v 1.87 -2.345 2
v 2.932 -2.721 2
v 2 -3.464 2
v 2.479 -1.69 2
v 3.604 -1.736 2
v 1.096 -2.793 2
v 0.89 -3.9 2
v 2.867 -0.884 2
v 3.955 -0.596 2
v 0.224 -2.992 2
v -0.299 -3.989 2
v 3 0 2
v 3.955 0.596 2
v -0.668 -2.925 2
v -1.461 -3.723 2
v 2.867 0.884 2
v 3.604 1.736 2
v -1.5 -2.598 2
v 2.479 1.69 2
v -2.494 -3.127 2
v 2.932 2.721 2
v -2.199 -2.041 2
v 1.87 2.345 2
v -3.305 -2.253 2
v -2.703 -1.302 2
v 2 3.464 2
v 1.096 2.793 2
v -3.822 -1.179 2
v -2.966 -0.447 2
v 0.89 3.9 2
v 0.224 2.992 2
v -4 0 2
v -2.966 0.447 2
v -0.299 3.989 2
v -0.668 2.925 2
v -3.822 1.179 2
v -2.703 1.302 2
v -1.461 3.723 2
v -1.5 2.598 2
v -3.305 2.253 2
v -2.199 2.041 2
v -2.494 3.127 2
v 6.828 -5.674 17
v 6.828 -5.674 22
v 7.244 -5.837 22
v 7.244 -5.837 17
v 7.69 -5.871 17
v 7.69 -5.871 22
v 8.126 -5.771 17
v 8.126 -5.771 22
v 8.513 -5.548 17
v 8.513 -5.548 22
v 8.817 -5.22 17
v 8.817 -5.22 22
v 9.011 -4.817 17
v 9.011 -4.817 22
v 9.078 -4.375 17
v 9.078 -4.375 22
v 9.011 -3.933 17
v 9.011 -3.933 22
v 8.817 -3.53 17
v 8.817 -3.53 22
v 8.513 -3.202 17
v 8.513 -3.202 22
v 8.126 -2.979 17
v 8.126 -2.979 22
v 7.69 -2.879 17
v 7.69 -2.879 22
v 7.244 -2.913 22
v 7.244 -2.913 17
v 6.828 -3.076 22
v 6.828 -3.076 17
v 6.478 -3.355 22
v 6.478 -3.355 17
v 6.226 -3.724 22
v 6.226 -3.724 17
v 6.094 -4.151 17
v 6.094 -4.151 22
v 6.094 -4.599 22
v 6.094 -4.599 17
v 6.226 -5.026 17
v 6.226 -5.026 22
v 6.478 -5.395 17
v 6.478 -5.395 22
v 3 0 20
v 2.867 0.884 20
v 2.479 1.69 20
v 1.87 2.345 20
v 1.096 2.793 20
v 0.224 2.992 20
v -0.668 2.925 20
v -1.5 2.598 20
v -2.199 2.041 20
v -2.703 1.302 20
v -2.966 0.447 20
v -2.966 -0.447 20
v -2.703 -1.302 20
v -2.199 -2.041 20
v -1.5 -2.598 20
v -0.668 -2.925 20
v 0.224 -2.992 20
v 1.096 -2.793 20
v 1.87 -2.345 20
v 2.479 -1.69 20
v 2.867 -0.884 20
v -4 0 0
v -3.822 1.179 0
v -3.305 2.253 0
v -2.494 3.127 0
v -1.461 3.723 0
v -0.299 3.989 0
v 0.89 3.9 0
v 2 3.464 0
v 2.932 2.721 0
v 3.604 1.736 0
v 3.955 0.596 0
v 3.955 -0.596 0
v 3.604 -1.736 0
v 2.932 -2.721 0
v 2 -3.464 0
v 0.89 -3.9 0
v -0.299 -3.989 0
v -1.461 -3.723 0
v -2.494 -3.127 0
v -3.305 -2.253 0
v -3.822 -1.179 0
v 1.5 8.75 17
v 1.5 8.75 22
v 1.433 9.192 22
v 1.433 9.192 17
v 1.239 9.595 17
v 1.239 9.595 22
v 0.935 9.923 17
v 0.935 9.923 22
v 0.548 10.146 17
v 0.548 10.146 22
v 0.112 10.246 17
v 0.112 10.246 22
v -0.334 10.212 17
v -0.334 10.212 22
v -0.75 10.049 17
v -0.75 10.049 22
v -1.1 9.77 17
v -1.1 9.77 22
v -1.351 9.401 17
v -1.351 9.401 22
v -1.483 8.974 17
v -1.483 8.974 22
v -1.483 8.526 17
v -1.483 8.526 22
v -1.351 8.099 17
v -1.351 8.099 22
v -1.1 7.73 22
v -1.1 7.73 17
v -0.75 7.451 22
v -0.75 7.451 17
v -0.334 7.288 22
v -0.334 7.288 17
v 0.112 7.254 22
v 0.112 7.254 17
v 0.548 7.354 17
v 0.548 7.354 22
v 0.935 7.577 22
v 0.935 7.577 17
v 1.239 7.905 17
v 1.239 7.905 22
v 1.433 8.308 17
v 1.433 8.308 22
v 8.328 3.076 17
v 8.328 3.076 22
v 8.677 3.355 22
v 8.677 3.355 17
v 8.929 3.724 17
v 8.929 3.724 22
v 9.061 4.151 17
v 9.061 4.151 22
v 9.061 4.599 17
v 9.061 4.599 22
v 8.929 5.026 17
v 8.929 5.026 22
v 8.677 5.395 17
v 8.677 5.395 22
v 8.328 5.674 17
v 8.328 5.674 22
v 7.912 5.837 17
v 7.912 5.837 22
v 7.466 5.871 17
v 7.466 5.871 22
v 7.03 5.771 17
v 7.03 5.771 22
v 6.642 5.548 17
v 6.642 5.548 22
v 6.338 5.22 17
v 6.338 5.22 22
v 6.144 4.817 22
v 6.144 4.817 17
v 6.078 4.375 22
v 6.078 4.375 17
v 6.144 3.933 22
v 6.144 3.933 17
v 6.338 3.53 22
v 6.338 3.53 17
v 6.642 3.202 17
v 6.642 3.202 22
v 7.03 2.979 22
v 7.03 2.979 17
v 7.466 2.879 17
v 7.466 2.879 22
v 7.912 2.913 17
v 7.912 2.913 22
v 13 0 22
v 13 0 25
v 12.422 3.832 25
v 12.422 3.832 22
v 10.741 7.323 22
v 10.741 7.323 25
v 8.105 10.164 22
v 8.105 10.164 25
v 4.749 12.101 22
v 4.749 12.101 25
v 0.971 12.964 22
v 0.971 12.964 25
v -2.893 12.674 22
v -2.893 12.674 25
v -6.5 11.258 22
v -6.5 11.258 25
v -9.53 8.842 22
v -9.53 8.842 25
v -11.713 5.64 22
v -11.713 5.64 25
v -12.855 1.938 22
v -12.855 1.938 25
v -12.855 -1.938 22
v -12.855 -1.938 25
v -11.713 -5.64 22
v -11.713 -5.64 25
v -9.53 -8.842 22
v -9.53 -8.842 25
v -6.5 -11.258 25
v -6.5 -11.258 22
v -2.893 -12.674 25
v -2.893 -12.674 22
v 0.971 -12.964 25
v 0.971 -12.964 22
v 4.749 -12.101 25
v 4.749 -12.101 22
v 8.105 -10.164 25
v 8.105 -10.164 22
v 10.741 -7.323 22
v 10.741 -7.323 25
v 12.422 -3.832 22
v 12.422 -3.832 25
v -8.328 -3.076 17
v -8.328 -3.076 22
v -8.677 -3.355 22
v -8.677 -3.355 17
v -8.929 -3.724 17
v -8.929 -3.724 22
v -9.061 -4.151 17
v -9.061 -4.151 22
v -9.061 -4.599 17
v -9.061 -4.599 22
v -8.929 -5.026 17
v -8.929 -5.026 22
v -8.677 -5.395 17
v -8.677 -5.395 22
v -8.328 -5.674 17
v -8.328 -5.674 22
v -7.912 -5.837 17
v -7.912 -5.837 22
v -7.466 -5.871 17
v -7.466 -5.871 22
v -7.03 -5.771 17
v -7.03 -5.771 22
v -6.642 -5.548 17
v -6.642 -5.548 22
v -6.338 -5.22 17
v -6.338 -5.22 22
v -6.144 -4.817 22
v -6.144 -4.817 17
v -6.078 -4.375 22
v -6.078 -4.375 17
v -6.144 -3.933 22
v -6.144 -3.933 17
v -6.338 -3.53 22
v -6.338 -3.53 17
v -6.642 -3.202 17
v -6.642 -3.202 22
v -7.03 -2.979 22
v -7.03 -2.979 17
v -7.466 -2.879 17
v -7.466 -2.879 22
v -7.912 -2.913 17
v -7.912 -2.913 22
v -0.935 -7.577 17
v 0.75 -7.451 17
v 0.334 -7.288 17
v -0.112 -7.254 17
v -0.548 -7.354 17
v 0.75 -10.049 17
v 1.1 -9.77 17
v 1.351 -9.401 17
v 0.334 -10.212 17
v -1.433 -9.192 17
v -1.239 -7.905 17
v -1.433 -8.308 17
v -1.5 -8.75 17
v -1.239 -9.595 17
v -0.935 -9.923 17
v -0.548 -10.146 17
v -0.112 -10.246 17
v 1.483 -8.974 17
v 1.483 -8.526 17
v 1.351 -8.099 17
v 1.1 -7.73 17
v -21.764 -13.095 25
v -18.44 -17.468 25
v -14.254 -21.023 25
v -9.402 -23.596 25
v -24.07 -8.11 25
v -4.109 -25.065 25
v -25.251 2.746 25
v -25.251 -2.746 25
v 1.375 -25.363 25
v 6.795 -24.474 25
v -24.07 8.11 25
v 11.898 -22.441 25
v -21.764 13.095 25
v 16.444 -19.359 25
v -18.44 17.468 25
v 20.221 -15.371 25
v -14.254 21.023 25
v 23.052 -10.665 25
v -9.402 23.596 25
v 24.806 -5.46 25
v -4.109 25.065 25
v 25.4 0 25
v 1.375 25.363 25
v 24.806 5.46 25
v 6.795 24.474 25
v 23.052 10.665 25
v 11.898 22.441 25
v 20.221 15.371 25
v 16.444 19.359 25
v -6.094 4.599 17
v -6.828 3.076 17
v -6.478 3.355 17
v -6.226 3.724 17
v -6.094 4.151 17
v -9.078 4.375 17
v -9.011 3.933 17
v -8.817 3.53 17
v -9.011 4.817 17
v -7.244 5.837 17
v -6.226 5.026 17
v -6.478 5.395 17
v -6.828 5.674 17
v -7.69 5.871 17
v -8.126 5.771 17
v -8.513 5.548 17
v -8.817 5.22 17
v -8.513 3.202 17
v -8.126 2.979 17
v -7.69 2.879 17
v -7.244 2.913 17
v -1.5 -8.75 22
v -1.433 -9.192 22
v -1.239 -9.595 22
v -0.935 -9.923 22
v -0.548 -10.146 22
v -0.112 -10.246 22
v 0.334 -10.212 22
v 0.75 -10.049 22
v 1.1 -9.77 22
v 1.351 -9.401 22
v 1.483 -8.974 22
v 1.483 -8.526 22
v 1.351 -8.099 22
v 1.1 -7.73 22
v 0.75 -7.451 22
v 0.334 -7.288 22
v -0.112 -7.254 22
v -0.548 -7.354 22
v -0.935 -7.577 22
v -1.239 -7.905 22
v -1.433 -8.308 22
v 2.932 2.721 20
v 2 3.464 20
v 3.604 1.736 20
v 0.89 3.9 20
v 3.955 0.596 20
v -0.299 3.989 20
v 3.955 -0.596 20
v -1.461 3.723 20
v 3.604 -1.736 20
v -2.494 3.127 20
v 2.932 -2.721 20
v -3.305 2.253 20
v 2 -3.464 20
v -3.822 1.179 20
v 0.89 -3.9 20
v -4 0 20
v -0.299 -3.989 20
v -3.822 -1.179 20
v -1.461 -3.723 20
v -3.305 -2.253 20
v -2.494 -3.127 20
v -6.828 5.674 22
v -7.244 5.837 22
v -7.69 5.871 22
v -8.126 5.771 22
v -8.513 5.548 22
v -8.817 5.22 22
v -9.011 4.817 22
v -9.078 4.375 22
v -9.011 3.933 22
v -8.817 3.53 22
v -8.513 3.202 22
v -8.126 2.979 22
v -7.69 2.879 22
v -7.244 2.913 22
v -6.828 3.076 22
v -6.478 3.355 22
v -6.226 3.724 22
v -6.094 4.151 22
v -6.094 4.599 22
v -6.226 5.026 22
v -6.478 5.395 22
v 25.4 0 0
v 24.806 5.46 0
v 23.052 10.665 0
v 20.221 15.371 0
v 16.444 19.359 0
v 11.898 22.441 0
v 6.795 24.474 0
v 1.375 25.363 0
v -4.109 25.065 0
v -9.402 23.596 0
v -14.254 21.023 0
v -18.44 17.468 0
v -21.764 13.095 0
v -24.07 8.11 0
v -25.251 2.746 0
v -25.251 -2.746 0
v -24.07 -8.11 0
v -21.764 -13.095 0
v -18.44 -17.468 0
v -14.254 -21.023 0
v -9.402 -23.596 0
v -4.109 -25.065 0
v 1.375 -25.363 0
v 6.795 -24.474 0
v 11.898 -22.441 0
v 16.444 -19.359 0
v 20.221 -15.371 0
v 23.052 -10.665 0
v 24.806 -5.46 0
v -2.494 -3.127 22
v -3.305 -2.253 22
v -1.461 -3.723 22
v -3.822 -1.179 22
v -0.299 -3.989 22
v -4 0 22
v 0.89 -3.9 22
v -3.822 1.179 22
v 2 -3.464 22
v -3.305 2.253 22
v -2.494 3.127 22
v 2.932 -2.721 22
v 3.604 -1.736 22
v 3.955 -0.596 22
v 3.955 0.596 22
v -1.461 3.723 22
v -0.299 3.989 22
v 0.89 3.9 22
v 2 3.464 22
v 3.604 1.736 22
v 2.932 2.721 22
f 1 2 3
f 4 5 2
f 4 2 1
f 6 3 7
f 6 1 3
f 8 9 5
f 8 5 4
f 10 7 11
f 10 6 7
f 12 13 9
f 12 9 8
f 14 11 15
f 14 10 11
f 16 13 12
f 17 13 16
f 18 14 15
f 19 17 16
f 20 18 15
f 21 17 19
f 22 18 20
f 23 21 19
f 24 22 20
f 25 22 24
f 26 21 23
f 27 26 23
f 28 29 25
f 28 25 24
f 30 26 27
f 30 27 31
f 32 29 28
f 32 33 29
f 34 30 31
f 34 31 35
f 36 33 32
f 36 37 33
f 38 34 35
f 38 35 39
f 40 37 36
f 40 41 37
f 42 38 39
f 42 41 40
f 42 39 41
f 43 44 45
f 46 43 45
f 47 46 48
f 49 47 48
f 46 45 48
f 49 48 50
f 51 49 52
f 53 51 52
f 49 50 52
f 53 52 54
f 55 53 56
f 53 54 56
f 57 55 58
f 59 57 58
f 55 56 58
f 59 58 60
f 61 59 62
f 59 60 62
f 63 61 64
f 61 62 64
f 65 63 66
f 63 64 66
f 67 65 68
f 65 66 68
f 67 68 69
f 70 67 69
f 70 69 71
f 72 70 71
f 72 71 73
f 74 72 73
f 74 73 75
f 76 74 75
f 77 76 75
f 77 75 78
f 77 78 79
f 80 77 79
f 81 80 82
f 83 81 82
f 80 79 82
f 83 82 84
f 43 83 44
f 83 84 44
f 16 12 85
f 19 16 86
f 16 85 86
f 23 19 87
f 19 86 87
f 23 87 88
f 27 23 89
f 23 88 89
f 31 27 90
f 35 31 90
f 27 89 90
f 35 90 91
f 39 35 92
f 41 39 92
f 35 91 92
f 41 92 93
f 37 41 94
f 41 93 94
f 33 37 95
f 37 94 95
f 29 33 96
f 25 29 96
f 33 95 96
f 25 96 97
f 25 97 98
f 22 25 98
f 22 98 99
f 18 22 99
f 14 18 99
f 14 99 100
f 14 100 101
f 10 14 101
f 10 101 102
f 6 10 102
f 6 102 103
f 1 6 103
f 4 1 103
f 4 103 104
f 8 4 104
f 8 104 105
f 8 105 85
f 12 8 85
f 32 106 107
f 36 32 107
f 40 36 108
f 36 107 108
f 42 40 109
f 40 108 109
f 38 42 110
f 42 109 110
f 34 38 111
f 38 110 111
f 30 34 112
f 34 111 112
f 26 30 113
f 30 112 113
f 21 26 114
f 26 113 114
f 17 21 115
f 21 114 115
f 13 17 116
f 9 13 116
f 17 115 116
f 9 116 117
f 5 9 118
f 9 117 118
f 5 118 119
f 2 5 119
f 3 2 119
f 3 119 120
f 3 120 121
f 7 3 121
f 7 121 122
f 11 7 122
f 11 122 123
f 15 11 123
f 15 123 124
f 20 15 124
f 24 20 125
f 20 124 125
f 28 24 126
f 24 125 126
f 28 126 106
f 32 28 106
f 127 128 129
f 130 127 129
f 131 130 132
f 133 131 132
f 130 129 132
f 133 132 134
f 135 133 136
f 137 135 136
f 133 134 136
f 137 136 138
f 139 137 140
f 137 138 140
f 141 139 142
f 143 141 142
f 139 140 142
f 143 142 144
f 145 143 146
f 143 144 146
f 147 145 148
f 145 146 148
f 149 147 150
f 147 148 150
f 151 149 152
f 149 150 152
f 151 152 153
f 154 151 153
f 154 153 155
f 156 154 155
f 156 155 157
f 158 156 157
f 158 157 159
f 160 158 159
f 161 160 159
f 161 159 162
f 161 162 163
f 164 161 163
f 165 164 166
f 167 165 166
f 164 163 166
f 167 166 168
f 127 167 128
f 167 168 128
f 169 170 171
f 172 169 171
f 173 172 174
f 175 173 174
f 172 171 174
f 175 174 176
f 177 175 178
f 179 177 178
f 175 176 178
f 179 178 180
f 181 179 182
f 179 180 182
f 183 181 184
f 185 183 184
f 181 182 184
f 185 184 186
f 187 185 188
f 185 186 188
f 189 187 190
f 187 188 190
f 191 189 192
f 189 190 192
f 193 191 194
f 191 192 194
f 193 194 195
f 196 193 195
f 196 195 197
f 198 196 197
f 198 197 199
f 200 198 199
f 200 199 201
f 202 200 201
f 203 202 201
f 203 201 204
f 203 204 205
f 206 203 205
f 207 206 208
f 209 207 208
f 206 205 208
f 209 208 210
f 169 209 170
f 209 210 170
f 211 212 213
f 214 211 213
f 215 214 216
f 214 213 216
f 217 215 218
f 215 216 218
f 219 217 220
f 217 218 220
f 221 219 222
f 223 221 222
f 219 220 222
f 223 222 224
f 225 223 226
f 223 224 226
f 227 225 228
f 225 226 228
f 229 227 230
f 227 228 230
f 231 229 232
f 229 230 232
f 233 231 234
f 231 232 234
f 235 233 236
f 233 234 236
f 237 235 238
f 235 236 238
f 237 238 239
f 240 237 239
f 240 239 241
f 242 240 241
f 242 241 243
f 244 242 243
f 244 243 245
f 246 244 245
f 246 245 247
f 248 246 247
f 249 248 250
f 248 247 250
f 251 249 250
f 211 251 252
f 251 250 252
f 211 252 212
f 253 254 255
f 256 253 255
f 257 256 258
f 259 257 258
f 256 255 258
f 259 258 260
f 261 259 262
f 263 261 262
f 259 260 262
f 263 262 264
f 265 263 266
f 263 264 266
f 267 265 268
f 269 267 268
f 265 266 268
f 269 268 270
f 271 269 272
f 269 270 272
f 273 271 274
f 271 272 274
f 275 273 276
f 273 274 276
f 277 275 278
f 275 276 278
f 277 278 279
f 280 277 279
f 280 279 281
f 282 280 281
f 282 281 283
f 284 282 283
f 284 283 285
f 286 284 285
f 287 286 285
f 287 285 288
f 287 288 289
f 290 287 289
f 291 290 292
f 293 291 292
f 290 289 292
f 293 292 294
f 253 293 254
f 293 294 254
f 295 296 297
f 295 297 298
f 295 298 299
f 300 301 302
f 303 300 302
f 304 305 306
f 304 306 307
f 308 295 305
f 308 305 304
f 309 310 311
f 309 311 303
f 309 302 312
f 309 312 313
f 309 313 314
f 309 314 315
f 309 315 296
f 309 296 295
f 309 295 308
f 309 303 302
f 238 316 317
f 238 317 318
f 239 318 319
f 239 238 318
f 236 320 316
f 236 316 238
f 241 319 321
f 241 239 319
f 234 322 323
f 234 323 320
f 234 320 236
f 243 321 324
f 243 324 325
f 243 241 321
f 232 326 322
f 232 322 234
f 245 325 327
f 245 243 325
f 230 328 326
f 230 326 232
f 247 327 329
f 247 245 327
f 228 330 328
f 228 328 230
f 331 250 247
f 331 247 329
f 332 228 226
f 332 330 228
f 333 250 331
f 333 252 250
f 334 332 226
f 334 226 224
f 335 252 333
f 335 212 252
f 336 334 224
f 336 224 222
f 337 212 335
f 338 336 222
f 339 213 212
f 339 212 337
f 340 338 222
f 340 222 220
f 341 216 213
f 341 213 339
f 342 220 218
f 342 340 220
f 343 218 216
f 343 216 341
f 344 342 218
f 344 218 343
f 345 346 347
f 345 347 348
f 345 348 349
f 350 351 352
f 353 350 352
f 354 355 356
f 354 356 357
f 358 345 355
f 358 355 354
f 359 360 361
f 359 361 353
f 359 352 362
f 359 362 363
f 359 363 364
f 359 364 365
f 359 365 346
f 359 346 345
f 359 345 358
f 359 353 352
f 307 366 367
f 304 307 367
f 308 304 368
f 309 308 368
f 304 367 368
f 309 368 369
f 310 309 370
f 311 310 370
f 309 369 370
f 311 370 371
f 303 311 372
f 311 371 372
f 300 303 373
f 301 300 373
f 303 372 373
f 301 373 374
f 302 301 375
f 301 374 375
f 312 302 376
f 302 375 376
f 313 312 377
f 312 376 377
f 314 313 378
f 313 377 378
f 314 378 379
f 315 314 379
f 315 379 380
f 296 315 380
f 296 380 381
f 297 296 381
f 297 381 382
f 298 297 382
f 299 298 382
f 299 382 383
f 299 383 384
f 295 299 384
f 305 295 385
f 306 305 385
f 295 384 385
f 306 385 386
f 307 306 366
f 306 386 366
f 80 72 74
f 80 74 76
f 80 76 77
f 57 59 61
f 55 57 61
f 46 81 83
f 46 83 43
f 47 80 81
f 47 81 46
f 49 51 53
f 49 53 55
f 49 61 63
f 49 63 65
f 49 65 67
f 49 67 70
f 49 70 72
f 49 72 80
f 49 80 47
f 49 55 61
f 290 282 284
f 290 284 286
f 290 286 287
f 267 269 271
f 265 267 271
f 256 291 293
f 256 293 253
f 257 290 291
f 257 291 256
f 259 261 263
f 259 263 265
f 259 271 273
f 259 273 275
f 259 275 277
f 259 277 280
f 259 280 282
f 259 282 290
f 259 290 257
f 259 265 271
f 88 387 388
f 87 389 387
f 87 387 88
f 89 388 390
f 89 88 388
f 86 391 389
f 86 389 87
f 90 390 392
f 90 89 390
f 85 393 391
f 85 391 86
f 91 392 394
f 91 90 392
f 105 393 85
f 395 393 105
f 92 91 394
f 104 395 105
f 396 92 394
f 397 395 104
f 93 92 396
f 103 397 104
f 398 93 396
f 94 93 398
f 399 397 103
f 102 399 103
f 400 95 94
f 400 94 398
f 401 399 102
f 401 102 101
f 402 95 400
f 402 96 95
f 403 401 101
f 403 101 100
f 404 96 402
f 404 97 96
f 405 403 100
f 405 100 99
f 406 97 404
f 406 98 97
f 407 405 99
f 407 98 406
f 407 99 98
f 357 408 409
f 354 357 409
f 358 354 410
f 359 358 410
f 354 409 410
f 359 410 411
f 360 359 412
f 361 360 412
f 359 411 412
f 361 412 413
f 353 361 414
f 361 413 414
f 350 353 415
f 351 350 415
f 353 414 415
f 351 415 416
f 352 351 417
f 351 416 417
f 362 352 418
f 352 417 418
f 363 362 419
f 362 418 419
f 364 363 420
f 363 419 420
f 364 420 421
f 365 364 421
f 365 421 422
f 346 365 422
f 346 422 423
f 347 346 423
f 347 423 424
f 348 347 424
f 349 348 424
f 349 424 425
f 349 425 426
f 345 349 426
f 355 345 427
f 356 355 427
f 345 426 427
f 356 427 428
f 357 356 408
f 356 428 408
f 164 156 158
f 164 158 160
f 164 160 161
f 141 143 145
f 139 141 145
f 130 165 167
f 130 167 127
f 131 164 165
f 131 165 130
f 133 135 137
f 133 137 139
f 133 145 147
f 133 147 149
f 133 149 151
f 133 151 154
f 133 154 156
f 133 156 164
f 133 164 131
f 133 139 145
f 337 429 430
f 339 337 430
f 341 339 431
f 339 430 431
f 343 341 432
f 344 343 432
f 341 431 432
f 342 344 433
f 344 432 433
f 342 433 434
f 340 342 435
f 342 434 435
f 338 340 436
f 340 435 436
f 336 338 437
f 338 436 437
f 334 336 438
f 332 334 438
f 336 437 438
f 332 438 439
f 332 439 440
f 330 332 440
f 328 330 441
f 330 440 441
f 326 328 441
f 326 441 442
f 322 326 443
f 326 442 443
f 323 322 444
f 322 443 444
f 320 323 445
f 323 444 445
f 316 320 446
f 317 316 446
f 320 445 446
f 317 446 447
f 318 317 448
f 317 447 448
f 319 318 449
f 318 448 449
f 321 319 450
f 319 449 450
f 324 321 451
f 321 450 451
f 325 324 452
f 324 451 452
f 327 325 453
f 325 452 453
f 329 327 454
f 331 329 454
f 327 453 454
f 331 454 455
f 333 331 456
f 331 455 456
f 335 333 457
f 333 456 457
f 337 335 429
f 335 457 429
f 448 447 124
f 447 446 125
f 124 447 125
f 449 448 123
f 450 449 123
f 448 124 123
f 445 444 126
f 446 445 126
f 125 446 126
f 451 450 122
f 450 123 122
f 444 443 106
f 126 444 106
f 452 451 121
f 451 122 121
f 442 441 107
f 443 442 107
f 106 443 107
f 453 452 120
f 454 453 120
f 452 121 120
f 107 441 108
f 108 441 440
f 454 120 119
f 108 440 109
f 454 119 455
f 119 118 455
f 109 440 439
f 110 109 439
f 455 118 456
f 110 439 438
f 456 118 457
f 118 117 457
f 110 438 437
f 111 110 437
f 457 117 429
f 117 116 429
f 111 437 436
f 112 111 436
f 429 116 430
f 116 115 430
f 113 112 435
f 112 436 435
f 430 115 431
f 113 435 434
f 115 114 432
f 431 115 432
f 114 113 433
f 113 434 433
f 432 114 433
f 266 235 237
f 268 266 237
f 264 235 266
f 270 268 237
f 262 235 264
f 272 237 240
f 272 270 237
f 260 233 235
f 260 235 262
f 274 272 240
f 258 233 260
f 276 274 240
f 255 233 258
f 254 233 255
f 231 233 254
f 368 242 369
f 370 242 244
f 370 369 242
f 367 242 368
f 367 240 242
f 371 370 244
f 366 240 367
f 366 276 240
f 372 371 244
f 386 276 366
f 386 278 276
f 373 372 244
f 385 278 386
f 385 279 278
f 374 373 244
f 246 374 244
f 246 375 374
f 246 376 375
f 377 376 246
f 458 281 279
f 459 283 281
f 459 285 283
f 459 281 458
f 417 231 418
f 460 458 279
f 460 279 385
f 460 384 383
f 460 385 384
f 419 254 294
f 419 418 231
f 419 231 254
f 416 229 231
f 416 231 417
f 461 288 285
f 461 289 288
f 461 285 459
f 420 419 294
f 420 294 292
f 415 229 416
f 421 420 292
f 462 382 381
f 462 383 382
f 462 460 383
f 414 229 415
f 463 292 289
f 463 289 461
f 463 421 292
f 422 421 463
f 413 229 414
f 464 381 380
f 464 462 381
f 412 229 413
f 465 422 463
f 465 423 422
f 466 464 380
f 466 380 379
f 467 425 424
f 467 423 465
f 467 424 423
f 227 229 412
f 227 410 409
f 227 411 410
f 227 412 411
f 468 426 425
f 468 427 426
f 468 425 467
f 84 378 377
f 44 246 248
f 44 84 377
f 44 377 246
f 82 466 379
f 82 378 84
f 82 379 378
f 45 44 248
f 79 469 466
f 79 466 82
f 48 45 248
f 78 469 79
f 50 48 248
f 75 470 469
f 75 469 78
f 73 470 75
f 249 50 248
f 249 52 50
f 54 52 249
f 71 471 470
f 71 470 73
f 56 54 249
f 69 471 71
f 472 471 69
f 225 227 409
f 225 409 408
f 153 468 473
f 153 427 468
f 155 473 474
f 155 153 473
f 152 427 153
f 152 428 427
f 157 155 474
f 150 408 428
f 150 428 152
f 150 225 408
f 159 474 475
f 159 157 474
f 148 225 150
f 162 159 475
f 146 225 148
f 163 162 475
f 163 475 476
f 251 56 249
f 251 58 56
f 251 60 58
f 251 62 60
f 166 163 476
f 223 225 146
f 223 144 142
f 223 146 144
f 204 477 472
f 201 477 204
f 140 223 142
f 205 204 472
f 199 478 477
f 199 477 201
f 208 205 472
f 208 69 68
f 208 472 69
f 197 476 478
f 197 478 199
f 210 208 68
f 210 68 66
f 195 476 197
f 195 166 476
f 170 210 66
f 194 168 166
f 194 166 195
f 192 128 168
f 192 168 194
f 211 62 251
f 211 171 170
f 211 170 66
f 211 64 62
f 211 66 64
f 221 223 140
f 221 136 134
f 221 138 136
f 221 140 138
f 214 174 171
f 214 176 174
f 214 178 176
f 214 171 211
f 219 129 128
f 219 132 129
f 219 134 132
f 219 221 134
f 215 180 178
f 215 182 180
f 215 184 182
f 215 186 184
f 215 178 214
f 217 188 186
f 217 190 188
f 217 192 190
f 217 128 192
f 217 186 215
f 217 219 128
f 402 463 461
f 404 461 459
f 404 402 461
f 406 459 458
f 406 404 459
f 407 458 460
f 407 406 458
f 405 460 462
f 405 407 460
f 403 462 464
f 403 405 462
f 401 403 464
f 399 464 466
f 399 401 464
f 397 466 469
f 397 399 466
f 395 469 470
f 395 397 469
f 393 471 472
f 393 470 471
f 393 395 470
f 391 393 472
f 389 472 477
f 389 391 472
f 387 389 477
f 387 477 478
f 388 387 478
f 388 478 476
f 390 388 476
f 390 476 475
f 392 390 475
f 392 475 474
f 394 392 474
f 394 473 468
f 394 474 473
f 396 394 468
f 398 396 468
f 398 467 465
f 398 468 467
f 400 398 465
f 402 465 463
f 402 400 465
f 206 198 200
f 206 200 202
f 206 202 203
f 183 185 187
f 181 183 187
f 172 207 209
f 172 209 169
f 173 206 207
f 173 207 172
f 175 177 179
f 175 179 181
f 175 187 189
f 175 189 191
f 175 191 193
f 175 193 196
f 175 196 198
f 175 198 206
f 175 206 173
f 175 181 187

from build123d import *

# Parameters (mm, degrees)
SKETCH1_R           = 25.4
BOSS_EXTRUDE1_DEPTH = 25
SKETCH2_R           = 3
CUT_EXTRUDE1_DEPTH  = 44.764369069
SKETCH4_R           = 4
CUT_EXTRUDE4_DEPTH  = 2
SKETCH6_R           = 13
CUT_EXTRUDE6_DEPTH  = 3
SKETCH9_R           = 1.5
CUT_EXTRUDE7_DEPTH  = 5
CUT_EXTRUDE8_START  = -5
SKETCH3_R           = 4
CUT_EXTRUDE8_DEPTH  = 5
CIRPATTERN1_COUNT   = 6


with BuildPart() as part:
    # Sketch1 → Boss-Extrude1 (new body)
    with BuildSketch(Plane.XY):
        Circle(SKETCH1_R)
    extrude(amount=BOSS_EXTRUDE1_DEPTH)

    # Sketch2 → Cut-Extrude1 (cut, through all)
    with BuildSketch(Plane.XY.offset(25)):
        Circle(SKETCH2_R)
    extrude(amount=-CUT_EXTRUDE1_DEPTH, mode=Mode.SUBTRACT)

    # Sketch4 → Cut-Extrude4 (cut)
    with BuildSketch(Plane(origin=(0, 0, 0), x_dir=(-1, 0, 0), z_dir=(0, 0, -1))):
        Circle(SKETCH4_R)
    extrude(amount=-CUT_EXTRUDE4_DEPTH, mode=Mode.SUBTRACT)

    # Sketch6 → Cut-Extrude6 (cut)
    with BuildSketch(Plane.XY.offset(25)):
        Circle(SKETCH6_R)
    extrude(amount=-CUT_EXTRUDE6_DEPTH, mode=Mode.SUBTRACT)

    # Sketch9 → Cut-Extrude7 (cut)
    with BuildSketch(Plane.XY.offset(22)):
        with Locations((0, 8.75)):
            Circle(SKETCH9_R)
    cut_extrude7 = extrude(amount=-CUT_EXTRUDE7_DEPTH, mode=Mode.SUBTRACT)

    # Sketch3 → Cut-Extrude8 (cut)
    with BuildSketch(Plane.XY.offset(25).offset(CUT_EXTRUDE8_START)):
        with Locations(Location((0, 0, 0), (0, 0, 180))):
            Circle(SKETCH3_R)
    extrude(amount=CUT_EXTRUDE8_DEPTH, mode=Mode.SUBTRACT)

    # CirPattern1: Cut-Extrude7 ×6 about axis
    cirpattern1_axis = Axis((0, 0, 0), (0, 0, 1))
    for i in range(1, CIRPATTERN1_COUNT):
        add(cut_extrude7.rotate(cirpattern1_axis, i * 360 / CIRPATTERN1_COUNT), mode=Mode.SUBTRACT)


solid = part.part
